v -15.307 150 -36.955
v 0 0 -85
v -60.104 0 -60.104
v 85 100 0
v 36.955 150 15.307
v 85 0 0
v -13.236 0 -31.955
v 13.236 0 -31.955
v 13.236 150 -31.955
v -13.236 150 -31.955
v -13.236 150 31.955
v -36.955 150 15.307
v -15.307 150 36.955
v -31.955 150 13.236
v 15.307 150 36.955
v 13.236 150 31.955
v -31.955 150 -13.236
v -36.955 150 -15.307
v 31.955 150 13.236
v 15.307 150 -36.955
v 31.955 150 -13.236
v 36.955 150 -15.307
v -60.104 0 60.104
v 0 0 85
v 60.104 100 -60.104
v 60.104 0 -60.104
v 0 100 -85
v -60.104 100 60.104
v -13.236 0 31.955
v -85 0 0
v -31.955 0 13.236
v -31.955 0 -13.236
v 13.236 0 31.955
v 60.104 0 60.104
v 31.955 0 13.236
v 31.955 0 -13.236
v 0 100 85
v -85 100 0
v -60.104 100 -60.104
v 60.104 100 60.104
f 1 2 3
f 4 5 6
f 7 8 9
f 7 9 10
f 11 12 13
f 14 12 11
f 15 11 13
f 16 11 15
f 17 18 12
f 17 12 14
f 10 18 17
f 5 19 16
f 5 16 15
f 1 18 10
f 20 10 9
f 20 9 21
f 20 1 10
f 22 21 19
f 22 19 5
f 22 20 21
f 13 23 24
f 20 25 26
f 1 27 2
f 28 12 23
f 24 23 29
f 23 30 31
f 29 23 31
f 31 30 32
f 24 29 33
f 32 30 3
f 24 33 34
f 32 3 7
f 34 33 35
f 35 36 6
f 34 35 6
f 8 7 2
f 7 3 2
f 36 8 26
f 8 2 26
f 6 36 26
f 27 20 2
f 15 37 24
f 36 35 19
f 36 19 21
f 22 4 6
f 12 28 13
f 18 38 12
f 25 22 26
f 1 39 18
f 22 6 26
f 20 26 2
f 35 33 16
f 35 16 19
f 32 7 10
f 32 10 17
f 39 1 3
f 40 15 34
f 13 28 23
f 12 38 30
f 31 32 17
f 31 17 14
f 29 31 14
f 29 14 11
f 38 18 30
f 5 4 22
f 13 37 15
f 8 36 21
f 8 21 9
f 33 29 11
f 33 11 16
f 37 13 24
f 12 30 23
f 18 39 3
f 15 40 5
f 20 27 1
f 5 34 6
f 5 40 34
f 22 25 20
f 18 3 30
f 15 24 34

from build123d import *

# Parameters (mm, degrees)
EXTRUDE_1_DEPTH                  = 150
SKETCH_10_W                      = 150
SKETCH_10_H                      = 201.944841161
CUT_EXTRUDE_9_DEPTH              = 232.130644437
PATTERN_CIRCULAR_6_COUNT         = 8
EXTRUDE_6_DEPTH                  = 150
CUT_EXTRUDE_10_REACH             = 194.224
CUT_EXTRUDE_10_DIRECTION_2_REACH = 194.224
PATTERN_CIRCULAR_7_COUNT         = 8
EXTRUDE_7_DEPTH                  = 150


with BuildPart() as part:
    # 草图1 → 凸台-拉伸1 (new body)
    with BuildSketch(Plane(origin=(0, 0, 0), x_dir=(1, 0, 0), z_dir=(0, 1, 0))):
        Polygon((-60.104076401, -60.104076401), (0, -85), (60.104076401, -60.104076401), (85, 0), (60.104076401, 60.104076401), (0, 85), (-60.104076401, 60.104076401), (-85, 0), align=None)
        Polygon((-15.307337295, -36.9551813), (15.307337295, -36.9551813), (36.9551813, -15.307337295), (36.9551813, 15.307337295), (15.307337295, 36.9551813), (-15.307337295, 36.9551813), (-36.9551813, 15.307337295), (-36.9551813, -15.307337295), align=None, mode=Mode.SUBTRACT)
    extrude(amount=EXTRUDE_1_DEPTH)

    # 草图10 → 切除-拉伸9 (cut, through all)
    with BuildSketch(Plane(origin=(-28.191943273, 18.923017893, 68.0613718), x_dir=(0.9287722113346277, 0.09928567118319402, 0.35710577557677253), z_dir=(-0.3706510211136421, 0.2487886640689572, 0.894830722079991))):
        with Locations((13.456718785, 57.315220344)):
            Rectangle(SKETCH_10_W, SKETCH_10_H)
    cut_extrude_9 = extrude(amount=CUT_EXTRUDE_9_DEPTH, mode=Mode.SUBTRACT)

    # 阵列(圆周)6: 切除-拉伸9 ×8 about axis
    pattern_circular_6_axis = Axis((0, 0, 0), (0, 1, 0))
    for i in range(1, PATTERN_CIRCULAR_6_COUNT):
        add(cut_extrude_9.rotate(pattern_circular_6_axis, i * 360 / PATTERN_CIRCULAR_6_COUNT), mode=Mode.SUBTRACT)

    # 草图13 → 凸台-拉伸6 (add, through all)
    with BuildSketch(Plane(origin=(0, 0, 0), x_dir=(1, 0, 0), z_dir=(0, 1, 0))):
        Polygon((-36.9551813, 15.307337295), (-85, 0), (-36.9551813, -15.307337295), align=None)
    extrude_6 = extrude(amount=EXTRUDE_6_DEPTH)

    # 草图14 → 切除-拉伸10 (cut, up to next)
    with BuildSketch(Plane.XY, mode=Mode.PRIVATE) as cut_extrude_10_sk1:
        Polygon((-36.9551813, 150), (-85, 150), (-85, 100), align=None)
    cut_extrude_10_tool1 = extrude(cut_extrude_10_sk1.sketch, amount=-CUT_EXTRUDE_10_REACH, mode=Mode.PRIVATE) & part.part
    cut_extrude_10 = cut_extrude_10_tool1.solids().sort_by_distance((-68.98506, 133.333333, 0))[0]
    add(cut_extrude_10, mode=Mode.SUBTRACT)

    # 草图14 → 切除-拉伸10 direction 2 (cut, up to next)
    with BuildSketch(Plane.XY, mode=Mode.PRIVATE) as cut_extrude_10_direction_2_sk1:
        Polygon((-36.9551813, 150), (-85, 150), (-85, 100), align=None)
    cut_extrude_10_direction_2_tool1 = extrude(cut_extrude_10_direction_2_sk1.sketch, amount=CUT_EXTRUDE_10_DIRECTION_2_REACH, mode=Mode.PRIVATE) & part.part
    cut_extrude_10_direction_2 = cut_extrude_10_direction_2_tool1.solids().sort_by_distance((-68.98506, 133.333333, 0))[0]
    add(cut_extrude_10_direction_2, mode=Mode.SUBTRACT)

    # 阵列(圆周)7: 凸台-拉伸6, 切除-拉伸10, 切除-拉伸10 direction 2 ×8 about axis
    pattern_circular_7_axis = Axis((0, 0, 0), (0, 1, 0))
    add([extrude_6.rotate(pattern_circular_7_axis, i * 360 / PATTERN_CIRCULAR_7_COUNT) for i in range(1, PATTERN_CIRCULAR_7_COUNT)])
    add([cut_extrude_10.rotate(pattern_circular_7_axis, i * 360 / PATTERN_CIRCULAR_7_COUNT) for i in range(1, PATTERN_CIRCULAR_7_COUNT)], mode=Mode.SUBTRACT)
    add([cut_extrude_10_direction_2.rotate(pattern_circular_7_axis, i * 360 / PATTERN_CIRCULAR_7_COUNT) for i in range(1, PATTERN_CIRCULAR_7_COUNT)], mode=Mode.SUBTRACT)

    # 草图1<3> → 凸台-拉伸7 (add)
    with BuildSketch(Plane(origin=(0, 0, 0), x_dir=(1, 0, 0), z_dir=(0, 1, 0))):
        Polygon((-36.9551813, -15.307337295), (-15.307337295, -36.9551813), (15.307337295, -36.9551813), (36.9551813, -15.307337295), (36.9551813, 15.307337295), (15.307337295, 36.9551813), (-15.307337295, 36.9551813), (-36.9551813, 15.307337295), align=None)
        Polygon((13.236269483, 31.9551813), (-13.236269483, 31.9551813), (-31.9551813, 13.236269483), (-31.9551813, -13.236269483), (-13.236269483, -31.9551813), (13.236269483, -31.9551813), (31.9551813, -13.236269483), (31.9551813, 13.236269483), align=None, mode=Mode.SUBTRACT)
    extrude(amount=EXTRUDE_7_DEPTH)


solid = part.part
